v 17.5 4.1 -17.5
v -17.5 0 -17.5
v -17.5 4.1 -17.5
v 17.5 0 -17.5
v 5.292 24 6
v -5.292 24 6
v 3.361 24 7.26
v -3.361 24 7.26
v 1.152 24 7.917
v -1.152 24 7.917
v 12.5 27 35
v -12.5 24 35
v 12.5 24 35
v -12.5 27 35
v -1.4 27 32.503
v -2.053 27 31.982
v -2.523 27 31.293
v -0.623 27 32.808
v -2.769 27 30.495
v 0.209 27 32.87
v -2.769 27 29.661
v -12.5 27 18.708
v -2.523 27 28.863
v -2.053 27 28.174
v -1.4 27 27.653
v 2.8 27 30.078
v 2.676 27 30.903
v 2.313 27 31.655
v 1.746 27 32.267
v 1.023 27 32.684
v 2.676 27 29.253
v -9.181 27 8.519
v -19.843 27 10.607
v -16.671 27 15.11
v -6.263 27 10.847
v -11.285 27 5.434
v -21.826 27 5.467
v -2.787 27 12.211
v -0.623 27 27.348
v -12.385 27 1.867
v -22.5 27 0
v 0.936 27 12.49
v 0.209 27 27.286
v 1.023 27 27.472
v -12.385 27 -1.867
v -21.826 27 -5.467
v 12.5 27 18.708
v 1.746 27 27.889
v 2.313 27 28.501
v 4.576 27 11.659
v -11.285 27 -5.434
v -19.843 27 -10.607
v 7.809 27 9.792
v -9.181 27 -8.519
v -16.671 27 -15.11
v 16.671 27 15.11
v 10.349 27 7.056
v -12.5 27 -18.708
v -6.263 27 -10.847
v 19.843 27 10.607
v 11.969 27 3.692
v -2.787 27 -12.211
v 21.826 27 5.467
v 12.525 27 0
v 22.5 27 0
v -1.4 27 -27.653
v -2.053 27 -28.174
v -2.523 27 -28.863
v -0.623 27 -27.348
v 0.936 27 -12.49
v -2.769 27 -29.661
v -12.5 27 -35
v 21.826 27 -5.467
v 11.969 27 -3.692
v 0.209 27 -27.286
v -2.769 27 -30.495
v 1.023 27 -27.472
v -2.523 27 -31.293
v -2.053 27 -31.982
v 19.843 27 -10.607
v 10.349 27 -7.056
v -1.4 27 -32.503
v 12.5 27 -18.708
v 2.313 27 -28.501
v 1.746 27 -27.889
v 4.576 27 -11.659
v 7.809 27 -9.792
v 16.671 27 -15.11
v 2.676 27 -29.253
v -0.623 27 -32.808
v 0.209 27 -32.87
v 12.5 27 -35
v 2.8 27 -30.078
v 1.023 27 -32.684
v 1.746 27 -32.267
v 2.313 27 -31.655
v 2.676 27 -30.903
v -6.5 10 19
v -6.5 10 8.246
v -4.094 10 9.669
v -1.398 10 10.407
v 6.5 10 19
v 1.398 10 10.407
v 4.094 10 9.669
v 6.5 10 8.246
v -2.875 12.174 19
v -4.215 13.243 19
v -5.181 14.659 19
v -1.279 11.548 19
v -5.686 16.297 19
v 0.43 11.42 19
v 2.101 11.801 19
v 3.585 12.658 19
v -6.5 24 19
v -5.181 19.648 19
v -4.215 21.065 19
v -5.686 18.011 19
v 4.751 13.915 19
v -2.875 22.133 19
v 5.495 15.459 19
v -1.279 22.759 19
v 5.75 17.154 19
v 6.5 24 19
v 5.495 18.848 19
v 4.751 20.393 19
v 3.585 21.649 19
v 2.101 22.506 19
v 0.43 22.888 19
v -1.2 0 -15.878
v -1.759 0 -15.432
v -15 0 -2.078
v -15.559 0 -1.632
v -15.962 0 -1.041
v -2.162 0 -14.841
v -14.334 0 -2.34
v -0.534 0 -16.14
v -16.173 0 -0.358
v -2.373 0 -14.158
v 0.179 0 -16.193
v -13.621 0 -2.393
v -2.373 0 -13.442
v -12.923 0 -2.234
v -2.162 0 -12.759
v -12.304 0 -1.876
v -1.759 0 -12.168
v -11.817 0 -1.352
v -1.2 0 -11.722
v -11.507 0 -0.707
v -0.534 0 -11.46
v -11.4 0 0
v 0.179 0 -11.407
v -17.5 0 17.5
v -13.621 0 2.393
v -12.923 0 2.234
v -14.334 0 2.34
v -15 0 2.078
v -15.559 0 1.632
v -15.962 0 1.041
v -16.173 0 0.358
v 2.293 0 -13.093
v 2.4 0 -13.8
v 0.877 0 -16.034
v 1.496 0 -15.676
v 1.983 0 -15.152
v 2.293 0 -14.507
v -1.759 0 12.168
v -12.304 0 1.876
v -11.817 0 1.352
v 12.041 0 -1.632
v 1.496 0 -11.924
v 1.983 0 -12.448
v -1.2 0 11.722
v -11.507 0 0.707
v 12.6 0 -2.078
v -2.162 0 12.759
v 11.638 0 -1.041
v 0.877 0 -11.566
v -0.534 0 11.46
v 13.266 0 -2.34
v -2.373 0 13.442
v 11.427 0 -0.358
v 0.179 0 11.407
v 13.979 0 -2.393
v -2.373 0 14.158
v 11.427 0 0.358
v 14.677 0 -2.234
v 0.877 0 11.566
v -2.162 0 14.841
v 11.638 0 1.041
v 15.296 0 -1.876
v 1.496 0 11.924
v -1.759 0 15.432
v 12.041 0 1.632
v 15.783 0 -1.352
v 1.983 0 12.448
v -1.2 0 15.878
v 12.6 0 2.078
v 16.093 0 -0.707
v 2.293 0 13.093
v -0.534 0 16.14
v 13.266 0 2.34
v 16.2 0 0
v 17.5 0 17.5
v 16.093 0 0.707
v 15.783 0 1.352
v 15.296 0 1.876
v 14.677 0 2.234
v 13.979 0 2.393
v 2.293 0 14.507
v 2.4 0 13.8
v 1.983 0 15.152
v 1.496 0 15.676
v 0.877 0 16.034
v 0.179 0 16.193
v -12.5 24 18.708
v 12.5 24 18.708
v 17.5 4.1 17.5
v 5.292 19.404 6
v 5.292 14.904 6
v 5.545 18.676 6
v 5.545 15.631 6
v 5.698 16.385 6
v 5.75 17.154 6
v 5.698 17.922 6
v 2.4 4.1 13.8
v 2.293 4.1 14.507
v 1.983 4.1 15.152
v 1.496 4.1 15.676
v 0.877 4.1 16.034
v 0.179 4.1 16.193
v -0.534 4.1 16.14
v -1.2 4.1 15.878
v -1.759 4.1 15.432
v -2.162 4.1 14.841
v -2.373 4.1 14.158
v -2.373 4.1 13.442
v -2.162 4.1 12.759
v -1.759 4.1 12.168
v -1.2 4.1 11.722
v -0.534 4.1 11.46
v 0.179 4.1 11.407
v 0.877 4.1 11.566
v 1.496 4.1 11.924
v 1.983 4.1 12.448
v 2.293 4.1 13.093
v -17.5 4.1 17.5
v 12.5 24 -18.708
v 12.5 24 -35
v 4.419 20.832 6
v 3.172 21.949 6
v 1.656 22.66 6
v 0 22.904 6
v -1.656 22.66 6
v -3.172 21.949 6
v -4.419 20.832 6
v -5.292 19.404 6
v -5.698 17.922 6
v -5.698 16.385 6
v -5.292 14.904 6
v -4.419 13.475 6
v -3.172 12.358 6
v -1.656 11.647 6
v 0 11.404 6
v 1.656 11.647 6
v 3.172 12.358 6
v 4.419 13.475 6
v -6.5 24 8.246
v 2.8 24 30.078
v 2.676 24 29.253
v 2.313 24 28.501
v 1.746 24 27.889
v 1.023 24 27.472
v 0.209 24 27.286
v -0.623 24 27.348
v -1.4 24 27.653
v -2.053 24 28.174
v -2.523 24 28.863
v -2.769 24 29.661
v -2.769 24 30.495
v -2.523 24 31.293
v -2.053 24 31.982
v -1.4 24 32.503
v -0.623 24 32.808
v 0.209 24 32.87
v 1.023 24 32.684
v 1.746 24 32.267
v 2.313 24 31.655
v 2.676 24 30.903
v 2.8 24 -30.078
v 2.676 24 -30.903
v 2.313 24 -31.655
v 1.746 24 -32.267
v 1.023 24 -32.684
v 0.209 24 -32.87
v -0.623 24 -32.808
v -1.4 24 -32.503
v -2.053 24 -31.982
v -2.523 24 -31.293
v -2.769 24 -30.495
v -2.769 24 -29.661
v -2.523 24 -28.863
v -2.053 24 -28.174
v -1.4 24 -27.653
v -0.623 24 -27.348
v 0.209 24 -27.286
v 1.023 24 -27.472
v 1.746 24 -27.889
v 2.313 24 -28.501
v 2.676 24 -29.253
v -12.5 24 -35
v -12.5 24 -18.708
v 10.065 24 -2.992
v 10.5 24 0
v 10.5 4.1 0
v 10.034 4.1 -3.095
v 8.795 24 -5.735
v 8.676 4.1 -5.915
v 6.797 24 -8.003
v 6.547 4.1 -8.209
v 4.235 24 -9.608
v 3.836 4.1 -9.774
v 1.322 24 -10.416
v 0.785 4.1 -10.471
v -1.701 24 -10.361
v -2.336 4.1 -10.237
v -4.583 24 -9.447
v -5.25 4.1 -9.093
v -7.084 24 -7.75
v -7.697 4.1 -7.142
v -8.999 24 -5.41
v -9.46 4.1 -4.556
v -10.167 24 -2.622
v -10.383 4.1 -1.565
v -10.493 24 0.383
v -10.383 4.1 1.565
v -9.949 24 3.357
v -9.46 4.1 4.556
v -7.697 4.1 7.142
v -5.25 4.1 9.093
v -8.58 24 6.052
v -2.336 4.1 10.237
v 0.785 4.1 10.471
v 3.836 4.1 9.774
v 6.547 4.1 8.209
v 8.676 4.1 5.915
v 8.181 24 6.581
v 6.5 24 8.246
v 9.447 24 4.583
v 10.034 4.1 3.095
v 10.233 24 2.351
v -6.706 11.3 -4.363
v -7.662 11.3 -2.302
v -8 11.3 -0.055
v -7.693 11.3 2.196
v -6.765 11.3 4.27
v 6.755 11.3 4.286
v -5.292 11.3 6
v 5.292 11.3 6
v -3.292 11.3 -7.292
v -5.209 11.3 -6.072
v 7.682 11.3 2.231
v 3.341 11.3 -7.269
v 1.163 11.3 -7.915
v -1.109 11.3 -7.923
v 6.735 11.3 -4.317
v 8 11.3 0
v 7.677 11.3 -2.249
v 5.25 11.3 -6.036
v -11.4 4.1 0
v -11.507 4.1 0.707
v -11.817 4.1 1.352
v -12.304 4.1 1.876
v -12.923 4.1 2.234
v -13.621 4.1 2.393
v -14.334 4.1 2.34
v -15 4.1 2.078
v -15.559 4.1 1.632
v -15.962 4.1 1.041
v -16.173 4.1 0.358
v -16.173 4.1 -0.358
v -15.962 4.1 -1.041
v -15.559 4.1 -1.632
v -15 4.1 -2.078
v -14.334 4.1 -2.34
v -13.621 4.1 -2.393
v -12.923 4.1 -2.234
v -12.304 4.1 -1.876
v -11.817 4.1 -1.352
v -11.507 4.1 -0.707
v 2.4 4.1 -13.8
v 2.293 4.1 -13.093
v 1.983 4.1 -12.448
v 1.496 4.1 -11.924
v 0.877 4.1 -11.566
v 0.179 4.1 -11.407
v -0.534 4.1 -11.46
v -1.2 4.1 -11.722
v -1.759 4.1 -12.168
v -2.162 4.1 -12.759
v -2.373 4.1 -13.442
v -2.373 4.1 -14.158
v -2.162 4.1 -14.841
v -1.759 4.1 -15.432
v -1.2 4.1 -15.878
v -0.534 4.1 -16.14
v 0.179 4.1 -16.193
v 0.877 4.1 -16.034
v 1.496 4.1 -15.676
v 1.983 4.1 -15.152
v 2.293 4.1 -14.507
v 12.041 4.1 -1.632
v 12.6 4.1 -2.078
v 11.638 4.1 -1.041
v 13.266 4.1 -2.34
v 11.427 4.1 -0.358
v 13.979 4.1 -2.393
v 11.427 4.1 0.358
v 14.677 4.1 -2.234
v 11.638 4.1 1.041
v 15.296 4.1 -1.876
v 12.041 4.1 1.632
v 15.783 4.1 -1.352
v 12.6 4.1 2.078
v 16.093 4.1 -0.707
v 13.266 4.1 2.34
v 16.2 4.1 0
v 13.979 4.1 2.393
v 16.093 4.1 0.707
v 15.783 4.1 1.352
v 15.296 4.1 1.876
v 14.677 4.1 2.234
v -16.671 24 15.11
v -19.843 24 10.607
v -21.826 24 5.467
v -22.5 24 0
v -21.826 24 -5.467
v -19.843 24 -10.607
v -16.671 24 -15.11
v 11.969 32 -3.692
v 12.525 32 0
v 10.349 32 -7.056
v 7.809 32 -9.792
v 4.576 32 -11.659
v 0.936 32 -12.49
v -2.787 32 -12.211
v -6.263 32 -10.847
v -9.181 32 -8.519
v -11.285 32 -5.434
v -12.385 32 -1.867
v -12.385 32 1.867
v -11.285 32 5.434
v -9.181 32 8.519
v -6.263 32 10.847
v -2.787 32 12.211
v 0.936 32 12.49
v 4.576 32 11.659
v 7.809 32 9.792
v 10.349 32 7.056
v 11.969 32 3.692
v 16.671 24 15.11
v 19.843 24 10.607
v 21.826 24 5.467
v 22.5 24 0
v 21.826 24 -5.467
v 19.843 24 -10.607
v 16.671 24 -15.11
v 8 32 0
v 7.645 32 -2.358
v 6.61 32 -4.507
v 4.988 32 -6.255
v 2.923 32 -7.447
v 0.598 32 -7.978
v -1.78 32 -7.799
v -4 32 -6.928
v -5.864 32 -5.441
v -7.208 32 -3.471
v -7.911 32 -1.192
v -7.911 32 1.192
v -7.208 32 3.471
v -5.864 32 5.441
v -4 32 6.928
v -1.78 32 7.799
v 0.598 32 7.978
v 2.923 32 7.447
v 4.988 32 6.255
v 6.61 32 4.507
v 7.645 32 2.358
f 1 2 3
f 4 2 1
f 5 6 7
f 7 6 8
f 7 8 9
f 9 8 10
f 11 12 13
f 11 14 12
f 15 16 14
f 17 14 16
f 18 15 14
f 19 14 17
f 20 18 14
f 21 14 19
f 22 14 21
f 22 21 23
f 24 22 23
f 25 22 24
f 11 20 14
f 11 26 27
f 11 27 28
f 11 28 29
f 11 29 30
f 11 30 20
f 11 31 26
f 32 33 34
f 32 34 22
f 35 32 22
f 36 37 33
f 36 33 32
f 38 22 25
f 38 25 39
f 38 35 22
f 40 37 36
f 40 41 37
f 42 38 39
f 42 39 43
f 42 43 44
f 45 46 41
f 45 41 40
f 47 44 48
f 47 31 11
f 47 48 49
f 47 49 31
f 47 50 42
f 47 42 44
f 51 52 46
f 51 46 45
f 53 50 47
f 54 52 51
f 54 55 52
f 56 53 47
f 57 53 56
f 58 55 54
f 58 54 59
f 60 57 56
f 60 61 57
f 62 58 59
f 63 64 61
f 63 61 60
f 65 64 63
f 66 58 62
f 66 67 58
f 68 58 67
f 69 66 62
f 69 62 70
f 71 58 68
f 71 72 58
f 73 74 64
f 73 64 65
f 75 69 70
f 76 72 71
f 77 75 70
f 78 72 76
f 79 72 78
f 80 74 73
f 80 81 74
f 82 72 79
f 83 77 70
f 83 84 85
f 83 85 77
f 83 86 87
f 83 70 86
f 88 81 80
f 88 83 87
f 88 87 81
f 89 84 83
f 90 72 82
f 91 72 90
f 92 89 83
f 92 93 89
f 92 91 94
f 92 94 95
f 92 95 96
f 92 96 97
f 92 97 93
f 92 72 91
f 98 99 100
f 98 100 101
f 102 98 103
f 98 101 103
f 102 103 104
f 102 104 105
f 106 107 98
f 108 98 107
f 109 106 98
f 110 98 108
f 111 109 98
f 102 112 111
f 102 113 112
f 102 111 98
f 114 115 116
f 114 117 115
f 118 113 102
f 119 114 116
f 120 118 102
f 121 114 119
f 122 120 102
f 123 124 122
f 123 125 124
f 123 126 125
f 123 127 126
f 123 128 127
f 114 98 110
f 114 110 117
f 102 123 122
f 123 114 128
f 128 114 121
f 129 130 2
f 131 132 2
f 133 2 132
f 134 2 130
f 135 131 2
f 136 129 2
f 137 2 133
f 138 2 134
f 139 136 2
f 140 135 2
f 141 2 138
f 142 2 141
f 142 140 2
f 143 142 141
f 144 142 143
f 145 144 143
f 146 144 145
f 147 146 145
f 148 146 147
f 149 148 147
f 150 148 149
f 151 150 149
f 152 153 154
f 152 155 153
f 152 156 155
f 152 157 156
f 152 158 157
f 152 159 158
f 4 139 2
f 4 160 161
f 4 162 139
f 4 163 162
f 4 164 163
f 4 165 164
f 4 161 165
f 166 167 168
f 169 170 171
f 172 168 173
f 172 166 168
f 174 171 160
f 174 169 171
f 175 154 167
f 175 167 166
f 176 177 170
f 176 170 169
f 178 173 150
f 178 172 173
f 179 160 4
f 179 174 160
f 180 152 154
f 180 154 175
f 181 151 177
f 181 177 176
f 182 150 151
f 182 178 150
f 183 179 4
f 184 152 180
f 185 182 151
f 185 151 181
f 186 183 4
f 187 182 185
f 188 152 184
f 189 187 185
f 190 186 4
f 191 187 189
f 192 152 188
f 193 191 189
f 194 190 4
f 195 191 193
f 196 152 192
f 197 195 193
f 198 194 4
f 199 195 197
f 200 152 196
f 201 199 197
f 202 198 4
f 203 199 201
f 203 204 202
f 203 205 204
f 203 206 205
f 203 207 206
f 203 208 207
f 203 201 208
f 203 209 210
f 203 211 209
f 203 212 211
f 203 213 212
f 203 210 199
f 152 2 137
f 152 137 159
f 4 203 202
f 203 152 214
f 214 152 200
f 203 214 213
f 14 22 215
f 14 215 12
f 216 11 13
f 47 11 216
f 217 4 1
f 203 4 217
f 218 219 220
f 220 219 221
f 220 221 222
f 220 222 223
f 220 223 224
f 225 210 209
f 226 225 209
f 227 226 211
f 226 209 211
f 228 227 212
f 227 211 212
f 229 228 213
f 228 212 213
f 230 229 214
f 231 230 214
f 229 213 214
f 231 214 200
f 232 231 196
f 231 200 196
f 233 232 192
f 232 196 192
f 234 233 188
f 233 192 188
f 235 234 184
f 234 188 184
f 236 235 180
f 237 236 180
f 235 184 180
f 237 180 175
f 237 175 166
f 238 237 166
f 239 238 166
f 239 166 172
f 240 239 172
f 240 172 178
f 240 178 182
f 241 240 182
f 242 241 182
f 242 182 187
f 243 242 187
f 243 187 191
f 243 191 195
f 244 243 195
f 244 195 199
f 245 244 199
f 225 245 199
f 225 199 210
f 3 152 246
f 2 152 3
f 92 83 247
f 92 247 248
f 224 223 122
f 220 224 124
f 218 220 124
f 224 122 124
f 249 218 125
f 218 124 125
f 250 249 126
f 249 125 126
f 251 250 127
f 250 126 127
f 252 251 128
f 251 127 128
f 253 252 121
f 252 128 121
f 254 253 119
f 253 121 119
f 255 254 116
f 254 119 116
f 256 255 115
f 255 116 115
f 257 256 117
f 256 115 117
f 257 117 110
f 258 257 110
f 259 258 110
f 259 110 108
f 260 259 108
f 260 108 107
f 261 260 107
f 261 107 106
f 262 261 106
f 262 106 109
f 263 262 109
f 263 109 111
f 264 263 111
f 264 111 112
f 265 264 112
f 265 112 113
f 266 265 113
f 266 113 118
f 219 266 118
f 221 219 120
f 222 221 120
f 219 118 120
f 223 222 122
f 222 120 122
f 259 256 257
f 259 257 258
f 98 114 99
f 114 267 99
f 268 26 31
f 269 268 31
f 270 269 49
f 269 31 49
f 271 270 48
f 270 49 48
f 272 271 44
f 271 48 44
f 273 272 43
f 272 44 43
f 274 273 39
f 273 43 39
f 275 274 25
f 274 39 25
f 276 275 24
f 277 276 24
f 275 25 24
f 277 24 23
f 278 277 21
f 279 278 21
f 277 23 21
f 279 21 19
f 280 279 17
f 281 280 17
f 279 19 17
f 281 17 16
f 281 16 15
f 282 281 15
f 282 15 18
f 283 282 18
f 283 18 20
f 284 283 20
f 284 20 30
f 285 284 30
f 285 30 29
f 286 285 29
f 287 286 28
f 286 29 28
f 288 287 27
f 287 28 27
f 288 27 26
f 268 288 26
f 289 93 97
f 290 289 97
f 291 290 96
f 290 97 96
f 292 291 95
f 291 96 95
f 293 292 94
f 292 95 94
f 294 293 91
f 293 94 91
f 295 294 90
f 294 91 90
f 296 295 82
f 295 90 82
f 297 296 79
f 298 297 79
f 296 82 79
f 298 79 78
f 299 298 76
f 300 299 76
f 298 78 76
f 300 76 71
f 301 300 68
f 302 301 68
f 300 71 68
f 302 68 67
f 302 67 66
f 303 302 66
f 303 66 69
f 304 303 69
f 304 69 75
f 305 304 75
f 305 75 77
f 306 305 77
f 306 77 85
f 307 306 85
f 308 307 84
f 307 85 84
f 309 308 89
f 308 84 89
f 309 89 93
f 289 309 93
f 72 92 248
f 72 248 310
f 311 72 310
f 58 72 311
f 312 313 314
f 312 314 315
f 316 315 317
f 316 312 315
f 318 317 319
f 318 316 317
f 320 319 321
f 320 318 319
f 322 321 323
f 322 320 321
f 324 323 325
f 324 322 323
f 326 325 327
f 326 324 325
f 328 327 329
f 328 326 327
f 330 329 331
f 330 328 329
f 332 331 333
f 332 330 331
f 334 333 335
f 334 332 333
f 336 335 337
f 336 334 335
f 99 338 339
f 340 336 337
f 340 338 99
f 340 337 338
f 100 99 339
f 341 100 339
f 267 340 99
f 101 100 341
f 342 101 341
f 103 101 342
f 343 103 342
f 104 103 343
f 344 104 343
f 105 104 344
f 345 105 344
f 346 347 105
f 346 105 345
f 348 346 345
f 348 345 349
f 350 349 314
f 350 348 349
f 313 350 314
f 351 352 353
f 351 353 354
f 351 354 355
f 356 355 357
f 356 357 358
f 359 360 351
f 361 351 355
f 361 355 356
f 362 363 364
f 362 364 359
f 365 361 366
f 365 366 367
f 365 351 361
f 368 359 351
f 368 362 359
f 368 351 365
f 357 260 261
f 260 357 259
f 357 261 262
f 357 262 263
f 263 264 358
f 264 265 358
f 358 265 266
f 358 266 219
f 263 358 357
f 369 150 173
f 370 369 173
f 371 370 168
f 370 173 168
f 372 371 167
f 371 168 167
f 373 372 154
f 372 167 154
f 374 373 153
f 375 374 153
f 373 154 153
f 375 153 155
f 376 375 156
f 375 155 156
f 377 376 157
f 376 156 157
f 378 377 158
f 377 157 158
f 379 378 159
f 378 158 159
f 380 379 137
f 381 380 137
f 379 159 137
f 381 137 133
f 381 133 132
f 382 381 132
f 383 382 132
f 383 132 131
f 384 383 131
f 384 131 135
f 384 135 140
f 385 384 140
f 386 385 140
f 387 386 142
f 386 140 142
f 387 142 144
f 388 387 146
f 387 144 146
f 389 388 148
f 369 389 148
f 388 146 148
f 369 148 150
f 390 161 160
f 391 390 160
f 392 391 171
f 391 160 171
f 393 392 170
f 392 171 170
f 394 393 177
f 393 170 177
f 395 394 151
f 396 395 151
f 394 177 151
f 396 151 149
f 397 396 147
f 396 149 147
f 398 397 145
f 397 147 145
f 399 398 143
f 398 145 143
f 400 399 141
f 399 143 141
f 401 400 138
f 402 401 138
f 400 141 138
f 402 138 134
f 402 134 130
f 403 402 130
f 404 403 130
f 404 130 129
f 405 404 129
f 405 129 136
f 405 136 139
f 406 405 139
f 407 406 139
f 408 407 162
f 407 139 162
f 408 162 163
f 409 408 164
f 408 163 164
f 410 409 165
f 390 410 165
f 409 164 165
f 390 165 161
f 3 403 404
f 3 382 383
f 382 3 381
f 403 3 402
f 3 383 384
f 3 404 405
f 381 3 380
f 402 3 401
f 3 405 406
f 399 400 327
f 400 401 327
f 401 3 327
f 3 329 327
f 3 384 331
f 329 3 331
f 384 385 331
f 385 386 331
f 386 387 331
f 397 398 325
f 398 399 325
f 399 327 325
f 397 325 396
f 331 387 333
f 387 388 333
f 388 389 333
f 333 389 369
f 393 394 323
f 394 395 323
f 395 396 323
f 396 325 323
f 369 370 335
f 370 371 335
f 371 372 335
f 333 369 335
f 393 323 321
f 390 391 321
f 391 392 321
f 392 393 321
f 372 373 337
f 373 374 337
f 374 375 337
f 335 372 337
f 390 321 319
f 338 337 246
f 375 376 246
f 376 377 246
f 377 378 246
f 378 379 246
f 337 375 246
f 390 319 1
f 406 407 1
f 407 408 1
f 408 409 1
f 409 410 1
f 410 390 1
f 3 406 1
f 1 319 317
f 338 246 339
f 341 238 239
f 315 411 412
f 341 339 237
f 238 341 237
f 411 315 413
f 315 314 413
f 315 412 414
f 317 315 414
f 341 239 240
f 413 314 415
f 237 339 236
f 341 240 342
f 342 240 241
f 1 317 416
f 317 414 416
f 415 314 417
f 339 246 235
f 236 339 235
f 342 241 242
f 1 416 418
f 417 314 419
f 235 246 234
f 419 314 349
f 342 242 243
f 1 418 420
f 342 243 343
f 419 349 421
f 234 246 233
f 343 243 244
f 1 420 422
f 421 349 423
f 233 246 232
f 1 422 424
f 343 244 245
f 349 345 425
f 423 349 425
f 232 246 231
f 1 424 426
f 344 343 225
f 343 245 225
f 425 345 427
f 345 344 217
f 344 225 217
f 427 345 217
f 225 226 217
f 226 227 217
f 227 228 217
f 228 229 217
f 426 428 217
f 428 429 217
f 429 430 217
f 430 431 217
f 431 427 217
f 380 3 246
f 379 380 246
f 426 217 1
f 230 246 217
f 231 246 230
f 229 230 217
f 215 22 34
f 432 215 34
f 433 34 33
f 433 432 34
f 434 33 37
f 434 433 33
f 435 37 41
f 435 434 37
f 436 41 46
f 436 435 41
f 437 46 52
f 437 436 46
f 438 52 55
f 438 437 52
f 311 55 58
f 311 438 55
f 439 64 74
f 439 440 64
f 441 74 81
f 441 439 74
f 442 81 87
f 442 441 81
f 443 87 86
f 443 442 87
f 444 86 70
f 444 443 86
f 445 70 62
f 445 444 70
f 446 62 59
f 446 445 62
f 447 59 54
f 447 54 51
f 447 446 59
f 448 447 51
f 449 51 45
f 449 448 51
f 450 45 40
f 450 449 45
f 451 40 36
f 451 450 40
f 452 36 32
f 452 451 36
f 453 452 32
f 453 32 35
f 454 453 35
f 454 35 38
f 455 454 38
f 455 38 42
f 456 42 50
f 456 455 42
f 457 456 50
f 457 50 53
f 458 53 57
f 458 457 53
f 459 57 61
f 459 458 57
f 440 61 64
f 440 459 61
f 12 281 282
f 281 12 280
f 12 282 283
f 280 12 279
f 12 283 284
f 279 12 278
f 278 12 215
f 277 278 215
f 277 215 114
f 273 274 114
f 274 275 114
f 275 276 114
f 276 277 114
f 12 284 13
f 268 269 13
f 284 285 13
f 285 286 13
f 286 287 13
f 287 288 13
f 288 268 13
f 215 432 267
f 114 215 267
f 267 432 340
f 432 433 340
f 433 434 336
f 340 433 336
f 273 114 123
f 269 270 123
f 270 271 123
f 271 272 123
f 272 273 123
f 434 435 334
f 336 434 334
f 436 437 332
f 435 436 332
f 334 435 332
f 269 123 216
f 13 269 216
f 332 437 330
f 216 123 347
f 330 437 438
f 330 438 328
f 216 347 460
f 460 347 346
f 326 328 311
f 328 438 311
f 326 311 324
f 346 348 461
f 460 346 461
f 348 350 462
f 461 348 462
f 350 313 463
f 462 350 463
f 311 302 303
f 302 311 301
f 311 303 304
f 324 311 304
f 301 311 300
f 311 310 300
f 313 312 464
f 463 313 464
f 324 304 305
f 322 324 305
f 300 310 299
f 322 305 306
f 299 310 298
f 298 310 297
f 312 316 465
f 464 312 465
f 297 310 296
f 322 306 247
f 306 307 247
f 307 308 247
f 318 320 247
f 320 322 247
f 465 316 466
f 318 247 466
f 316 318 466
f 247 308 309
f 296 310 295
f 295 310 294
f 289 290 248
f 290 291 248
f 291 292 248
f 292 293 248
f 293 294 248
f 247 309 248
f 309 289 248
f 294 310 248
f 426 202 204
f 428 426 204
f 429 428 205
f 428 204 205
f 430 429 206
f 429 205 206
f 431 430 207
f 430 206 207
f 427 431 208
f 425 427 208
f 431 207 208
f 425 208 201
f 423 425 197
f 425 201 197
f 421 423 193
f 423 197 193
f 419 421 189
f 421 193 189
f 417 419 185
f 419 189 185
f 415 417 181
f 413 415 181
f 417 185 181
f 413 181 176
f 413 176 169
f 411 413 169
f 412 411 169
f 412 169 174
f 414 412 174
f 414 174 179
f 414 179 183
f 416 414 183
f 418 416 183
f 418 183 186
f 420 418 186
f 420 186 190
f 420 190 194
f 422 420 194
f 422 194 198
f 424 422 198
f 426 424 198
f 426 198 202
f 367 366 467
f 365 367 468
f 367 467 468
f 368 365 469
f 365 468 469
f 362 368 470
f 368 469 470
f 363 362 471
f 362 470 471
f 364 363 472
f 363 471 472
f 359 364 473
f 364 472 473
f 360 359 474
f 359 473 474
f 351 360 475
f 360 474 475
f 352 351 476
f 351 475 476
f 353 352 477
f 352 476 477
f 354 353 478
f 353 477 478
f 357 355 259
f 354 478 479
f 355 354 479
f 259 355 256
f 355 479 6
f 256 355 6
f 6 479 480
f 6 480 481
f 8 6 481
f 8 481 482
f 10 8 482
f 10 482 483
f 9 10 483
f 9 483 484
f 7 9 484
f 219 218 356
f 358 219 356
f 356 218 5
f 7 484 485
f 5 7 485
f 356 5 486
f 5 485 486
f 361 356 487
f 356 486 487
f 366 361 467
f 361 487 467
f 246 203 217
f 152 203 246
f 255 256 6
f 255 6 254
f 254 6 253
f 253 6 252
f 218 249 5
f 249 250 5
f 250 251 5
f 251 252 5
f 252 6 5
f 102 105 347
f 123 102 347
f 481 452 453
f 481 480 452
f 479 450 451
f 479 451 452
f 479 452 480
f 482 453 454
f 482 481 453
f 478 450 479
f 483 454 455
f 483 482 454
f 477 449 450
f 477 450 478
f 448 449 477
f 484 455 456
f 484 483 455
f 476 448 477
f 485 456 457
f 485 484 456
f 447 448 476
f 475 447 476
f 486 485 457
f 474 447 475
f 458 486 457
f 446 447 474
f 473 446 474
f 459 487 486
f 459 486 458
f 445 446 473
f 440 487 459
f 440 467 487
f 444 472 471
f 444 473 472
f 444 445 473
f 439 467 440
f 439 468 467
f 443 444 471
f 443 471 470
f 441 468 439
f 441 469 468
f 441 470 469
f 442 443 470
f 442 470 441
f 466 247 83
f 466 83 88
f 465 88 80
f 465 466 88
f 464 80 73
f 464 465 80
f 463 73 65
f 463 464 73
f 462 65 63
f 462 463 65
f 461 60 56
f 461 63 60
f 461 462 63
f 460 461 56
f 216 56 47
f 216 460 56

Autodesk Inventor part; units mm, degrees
ref_plane "YZ Plane" through (0, 0, 0) normal (1, 0, 0) x (0, 1, 0)
ref_plane "XZ Plane" through (0, 0, 0) normal (0, 1, 0) x (-1, 0, 0)
sketch "Sketch1" plane through (0, 0, 0) normal (0, 0, 1) x (1, 0, 0)
  line L0 (12.525, 32) -> (8, 32)
  line L1 (8, 0) -> (8, 24)
  line L2 (22.5, 27) -> (22.5, 24)
  line L3 (22.5, 24) -> (12.525, 24)
  line L4 (10.5, 0) -> (10.5, 24)
  line L5 (10.5, 32) -> (8, 32)
  line L6 (8, 27) -> (8, 32)
  line L7 (12.525, 27) -> (22.5, 27)
  line L8 (8, 24) -> (8, 27)
  line L9 (12.525, 24) -> (10.5, 24)
  line L10 (12.525, 27) -> (12.525, 32)
  line L11 (8, 0) -> (10.5, 0)
  line L12 (0, -6.4) -> (0, 38.4) projected
  point P0 (0, 0)
revolve "Revolution1" add sketch "Sketch1" angle 360 about axis through (0, -10, 0) along (0, 1, 0)
sketch "Sketch2" plane through (0, 27, 0) normal (0, 1, 0) x (1, 0, 0)
  line L0 (12.5, 35) -> (-12.5, 35)
  line L1 (-12.5, 35) -> (-12.5, -35)
  line L2 (-12.5, -35) -> (12.5, -35)
  line L3 (12.5, -35) -> (12.5, 35)
  point P0 (0, 0)
  dimension "d8" = 25
  dimension "d9" = 70
extrude "Extrusion1" add sketch "Sketch2" against normal blind 3
sketch "Sketch3" plane through (0, 27, 0) normal (0, 1, 0) x (1, 0, 0)
  circle A0 centre (0, 0) radius 8
extrude "Extrusion2" cut sketch "Sketch3" against normal blind 3
sketch "Sketch4" plane through (-12.5, 27, 35) normal (0, 1, 0) x (1, 0, 0)
  line L0 (12.5, 35) -> (12.5, 65.078)
  line L1 (12.5, 35) -> (12.5, 4.922)
  circle A0 centre (12.5, 65.078) radius 2.8
  circle A1 centre (12.5, 4.922) radius 2.8
  dimension "d14" = 30.078
  dimension "d15" = 30.078
  dimension "d16" = 5.6
  dimension "d17" = 5.6
extrude "Extrusion3" cut sketch "Sketch4" against normal blind 3
sketch "Sketch5" plane through (0, 0, 0) normal (0, -1, 0) x (1, 0, 0)
  line L0 (17.5, 17.5) -> (-17.5, 17.5)
  line L1 (-17.5, 17.5) -> (-17.5, -17.5)
  line L2 (-17.5, -17.5) -> (17.5, -17.5)
  line L3 (17.5, -17.5) -> (17.5, 17.5)
  circle A0 centre (0, 13.8) radius 2.4
  circle A1 centre (13.8, 0) radius 2.4
  circle A2 centre (0, -13.8) radius 2.4
  circle A3 centre (-13.8, 0) radius 2.4
  point P0 (0, 0)
  dimension "d20" = 35
  dimension "d21" = 35
  dimension "d26" = 4.8
  dimension "d28" = 4.8
extrude "Extrusion4" add sketch "Sketch5" against normal blind 4.1
sketch "Sketch6" plane through (17.5, 0, -17.5) normal (0, 0, -1) x (-1, 0, 0)
  point P0 (17.5, 0)
ref_plane "Work Plane1" through (0, 0, 6) normal (0, 0, 1) x (1, 0, 0)
sketch "Sketch7" plane through (0, 0, 6) normal (0, 0, 1) x (1, 0, 0)
  line L0 (-10.5, 24) -> (10.5, 24) projected
  line L1 (6.5, 24) -> (-6.5, 24)
  line L2 (-6.5, 24) -> (-6.5, 10)
  line L3 (-6.5, 10) -> (6.5, 10)
  line L4 (6.5, 10) -> (6.5, 24)
  point P0 (0, 0)
  dimension "d33" = 13
  dimension "d34" = 14
extrude "Extrusion5" add sketch "Sketch7" along normal blind 13
sketch "Sketch8" plane through (0, 0, 19) normal (0, 0, 1) x (1, 0, 0)
  circle A0 centre (0, 17.1536) radius 5.75
  point P0 (0, 0)
  dimension "d37" = 11.5
extrude "Extrusion6" cut sketch "Sketch8" against normal blind 13
sketch "Sketch9" plane through (0, 4.1, 0) normal (0, 1, 0) x (1, 0, 0)
  circle A0 centre (0, 0) radius 8
extrude "Extrusion7" add sketch "Sketch9" along normal blind 7.2
properties part number "Vacuum Gripper holder"
